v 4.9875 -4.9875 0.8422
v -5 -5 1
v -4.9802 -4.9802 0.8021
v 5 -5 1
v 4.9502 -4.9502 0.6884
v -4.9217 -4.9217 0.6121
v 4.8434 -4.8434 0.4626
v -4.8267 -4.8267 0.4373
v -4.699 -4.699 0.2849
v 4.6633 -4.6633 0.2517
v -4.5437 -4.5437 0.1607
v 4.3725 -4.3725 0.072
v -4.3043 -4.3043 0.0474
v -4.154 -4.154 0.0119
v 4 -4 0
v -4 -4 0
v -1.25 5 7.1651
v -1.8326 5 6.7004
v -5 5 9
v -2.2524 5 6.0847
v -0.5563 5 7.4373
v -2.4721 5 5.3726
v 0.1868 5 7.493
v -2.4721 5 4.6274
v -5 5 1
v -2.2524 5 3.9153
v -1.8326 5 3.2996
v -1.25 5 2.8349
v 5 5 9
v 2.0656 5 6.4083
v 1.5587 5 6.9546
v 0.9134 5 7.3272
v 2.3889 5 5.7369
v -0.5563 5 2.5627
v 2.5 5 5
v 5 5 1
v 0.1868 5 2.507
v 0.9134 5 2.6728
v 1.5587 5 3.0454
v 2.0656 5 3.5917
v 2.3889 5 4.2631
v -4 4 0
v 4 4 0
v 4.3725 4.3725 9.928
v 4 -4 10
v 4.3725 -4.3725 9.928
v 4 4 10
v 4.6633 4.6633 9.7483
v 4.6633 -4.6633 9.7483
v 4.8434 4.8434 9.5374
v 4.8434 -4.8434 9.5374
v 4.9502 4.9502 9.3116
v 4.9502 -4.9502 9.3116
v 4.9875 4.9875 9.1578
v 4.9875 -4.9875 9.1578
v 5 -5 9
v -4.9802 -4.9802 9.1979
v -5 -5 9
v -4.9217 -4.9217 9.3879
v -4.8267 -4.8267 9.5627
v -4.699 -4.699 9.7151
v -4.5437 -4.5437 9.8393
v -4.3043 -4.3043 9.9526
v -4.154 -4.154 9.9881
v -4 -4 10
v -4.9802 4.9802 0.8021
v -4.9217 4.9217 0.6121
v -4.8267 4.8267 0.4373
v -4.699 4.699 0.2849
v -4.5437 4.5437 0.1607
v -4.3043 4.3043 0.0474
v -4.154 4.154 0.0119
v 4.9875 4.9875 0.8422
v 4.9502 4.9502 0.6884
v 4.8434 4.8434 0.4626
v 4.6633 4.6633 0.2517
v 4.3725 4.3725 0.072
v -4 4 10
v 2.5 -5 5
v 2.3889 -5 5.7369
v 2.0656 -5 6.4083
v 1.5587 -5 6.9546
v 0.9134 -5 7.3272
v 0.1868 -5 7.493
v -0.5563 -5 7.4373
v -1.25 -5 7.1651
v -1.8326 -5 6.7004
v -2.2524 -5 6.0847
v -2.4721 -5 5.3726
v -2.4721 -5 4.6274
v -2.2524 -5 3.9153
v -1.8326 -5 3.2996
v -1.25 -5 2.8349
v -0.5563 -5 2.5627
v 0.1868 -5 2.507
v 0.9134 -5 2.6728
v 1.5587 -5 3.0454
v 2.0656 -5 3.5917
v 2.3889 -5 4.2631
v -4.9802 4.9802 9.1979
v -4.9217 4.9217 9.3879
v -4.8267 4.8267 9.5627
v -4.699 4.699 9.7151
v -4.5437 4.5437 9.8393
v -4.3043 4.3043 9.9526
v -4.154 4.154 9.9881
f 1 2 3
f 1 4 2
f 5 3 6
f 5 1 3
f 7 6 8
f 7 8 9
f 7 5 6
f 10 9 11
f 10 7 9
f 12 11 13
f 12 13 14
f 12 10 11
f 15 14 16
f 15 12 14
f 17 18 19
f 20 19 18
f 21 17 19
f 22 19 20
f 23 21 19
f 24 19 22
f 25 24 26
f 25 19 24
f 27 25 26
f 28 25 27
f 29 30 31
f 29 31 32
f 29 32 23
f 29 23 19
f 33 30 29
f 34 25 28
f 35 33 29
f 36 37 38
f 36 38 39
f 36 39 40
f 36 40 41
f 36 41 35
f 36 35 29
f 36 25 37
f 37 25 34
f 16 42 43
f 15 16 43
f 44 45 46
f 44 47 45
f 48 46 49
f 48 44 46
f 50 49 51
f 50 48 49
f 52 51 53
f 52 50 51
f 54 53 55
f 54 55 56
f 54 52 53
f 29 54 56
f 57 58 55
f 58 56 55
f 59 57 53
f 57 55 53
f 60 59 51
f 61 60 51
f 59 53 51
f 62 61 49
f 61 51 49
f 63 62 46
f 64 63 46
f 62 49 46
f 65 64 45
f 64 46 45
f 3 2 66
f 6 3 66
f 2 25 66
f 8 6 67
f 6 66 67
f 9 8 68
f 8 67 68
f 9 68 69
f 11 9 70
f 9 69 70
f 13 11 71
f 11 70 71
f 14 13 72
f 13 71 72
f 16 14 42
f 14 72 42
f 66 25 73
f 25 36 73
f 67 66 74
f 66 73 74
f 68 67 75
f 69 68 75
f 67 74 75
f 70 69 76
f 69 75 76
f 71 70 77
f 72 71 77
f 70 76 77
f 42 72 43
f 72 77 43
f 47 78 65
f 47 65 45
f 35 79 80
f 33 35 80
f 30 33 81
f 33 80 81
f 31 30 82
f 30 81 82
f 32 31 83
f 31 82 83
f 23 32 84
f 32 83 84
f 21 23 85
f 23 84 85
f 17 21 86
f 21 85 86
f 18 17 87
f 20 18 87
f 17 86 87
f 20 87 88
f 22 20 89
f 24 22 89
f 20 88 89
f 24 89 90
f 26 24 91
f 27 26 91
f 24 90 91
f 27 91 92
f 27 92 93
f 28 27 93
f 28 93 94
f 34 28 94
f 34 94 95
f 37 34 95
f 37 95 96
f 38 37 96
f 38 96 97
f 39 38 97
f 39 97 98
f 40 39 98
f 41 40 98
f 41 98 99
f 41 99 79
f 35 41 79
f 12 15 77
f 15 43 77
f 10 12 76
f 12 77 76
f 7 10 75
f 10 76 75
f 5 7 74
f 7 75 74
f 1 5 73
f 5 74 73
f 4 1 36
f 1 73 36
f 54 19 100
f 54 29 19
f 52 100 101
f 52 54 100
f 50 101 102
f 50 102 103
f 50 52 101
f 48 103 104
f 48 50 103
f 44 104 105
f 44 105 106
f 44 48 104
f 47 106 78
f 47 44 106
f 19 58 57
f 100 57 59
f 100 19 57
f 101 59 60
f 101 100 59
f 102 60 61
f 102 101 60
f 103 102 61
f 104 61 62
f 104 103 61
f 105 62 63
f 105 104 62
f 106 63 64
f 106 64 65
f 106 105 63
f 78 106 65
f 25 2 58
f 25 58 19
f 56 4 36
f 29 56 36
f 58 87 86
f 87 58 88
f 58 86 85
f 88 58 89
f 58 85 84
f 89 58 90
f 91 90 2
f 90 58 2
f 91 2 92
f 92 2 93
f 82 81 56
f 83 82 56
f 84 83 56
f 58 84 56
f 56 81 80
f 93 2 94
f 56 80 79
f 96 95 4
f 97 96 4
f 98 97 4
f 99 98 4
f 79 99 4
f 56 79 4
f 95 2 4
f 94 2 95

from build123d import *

# Parameters (mm, degrees)
F0_W     = 10
F0_H     = 10
F1_DEPTH = 10
F2_R     = 2.5
F3_DEPTH = 10.1
F4_R     = 1


with BuildPart() as f1:
    # F0 (on Top) → F1 (new body)
    with BuildSketch(Plane.XY):
        Rectangle(F0_W, F0_H)
    extrude(amount=F1_DEPTH)

    # F2 (on face) → F3 (cut)
    with BuildSketch(Plane.XZ.offset(5)):
        with Locations((0, 5)):
            Circle(F2_R)
    extrude(amount=-F3_DEPTH, mode=Mode.SUBTRACT)

    # F4
    f4_edges = [f1.edges().sort_by_distance(p)[0] for p in [
        (5, 0, 10),
        (0, 5, 10),
        (-5, 0, 10),
        (0, -5, 10),
        (5, 0, 0),
        (0, 5, 0),
        (-5, 0, 0),
        (0, -5, 0),
    ]]
    fillet(f4_edges, radius=F4_R)


solid = f1.part
